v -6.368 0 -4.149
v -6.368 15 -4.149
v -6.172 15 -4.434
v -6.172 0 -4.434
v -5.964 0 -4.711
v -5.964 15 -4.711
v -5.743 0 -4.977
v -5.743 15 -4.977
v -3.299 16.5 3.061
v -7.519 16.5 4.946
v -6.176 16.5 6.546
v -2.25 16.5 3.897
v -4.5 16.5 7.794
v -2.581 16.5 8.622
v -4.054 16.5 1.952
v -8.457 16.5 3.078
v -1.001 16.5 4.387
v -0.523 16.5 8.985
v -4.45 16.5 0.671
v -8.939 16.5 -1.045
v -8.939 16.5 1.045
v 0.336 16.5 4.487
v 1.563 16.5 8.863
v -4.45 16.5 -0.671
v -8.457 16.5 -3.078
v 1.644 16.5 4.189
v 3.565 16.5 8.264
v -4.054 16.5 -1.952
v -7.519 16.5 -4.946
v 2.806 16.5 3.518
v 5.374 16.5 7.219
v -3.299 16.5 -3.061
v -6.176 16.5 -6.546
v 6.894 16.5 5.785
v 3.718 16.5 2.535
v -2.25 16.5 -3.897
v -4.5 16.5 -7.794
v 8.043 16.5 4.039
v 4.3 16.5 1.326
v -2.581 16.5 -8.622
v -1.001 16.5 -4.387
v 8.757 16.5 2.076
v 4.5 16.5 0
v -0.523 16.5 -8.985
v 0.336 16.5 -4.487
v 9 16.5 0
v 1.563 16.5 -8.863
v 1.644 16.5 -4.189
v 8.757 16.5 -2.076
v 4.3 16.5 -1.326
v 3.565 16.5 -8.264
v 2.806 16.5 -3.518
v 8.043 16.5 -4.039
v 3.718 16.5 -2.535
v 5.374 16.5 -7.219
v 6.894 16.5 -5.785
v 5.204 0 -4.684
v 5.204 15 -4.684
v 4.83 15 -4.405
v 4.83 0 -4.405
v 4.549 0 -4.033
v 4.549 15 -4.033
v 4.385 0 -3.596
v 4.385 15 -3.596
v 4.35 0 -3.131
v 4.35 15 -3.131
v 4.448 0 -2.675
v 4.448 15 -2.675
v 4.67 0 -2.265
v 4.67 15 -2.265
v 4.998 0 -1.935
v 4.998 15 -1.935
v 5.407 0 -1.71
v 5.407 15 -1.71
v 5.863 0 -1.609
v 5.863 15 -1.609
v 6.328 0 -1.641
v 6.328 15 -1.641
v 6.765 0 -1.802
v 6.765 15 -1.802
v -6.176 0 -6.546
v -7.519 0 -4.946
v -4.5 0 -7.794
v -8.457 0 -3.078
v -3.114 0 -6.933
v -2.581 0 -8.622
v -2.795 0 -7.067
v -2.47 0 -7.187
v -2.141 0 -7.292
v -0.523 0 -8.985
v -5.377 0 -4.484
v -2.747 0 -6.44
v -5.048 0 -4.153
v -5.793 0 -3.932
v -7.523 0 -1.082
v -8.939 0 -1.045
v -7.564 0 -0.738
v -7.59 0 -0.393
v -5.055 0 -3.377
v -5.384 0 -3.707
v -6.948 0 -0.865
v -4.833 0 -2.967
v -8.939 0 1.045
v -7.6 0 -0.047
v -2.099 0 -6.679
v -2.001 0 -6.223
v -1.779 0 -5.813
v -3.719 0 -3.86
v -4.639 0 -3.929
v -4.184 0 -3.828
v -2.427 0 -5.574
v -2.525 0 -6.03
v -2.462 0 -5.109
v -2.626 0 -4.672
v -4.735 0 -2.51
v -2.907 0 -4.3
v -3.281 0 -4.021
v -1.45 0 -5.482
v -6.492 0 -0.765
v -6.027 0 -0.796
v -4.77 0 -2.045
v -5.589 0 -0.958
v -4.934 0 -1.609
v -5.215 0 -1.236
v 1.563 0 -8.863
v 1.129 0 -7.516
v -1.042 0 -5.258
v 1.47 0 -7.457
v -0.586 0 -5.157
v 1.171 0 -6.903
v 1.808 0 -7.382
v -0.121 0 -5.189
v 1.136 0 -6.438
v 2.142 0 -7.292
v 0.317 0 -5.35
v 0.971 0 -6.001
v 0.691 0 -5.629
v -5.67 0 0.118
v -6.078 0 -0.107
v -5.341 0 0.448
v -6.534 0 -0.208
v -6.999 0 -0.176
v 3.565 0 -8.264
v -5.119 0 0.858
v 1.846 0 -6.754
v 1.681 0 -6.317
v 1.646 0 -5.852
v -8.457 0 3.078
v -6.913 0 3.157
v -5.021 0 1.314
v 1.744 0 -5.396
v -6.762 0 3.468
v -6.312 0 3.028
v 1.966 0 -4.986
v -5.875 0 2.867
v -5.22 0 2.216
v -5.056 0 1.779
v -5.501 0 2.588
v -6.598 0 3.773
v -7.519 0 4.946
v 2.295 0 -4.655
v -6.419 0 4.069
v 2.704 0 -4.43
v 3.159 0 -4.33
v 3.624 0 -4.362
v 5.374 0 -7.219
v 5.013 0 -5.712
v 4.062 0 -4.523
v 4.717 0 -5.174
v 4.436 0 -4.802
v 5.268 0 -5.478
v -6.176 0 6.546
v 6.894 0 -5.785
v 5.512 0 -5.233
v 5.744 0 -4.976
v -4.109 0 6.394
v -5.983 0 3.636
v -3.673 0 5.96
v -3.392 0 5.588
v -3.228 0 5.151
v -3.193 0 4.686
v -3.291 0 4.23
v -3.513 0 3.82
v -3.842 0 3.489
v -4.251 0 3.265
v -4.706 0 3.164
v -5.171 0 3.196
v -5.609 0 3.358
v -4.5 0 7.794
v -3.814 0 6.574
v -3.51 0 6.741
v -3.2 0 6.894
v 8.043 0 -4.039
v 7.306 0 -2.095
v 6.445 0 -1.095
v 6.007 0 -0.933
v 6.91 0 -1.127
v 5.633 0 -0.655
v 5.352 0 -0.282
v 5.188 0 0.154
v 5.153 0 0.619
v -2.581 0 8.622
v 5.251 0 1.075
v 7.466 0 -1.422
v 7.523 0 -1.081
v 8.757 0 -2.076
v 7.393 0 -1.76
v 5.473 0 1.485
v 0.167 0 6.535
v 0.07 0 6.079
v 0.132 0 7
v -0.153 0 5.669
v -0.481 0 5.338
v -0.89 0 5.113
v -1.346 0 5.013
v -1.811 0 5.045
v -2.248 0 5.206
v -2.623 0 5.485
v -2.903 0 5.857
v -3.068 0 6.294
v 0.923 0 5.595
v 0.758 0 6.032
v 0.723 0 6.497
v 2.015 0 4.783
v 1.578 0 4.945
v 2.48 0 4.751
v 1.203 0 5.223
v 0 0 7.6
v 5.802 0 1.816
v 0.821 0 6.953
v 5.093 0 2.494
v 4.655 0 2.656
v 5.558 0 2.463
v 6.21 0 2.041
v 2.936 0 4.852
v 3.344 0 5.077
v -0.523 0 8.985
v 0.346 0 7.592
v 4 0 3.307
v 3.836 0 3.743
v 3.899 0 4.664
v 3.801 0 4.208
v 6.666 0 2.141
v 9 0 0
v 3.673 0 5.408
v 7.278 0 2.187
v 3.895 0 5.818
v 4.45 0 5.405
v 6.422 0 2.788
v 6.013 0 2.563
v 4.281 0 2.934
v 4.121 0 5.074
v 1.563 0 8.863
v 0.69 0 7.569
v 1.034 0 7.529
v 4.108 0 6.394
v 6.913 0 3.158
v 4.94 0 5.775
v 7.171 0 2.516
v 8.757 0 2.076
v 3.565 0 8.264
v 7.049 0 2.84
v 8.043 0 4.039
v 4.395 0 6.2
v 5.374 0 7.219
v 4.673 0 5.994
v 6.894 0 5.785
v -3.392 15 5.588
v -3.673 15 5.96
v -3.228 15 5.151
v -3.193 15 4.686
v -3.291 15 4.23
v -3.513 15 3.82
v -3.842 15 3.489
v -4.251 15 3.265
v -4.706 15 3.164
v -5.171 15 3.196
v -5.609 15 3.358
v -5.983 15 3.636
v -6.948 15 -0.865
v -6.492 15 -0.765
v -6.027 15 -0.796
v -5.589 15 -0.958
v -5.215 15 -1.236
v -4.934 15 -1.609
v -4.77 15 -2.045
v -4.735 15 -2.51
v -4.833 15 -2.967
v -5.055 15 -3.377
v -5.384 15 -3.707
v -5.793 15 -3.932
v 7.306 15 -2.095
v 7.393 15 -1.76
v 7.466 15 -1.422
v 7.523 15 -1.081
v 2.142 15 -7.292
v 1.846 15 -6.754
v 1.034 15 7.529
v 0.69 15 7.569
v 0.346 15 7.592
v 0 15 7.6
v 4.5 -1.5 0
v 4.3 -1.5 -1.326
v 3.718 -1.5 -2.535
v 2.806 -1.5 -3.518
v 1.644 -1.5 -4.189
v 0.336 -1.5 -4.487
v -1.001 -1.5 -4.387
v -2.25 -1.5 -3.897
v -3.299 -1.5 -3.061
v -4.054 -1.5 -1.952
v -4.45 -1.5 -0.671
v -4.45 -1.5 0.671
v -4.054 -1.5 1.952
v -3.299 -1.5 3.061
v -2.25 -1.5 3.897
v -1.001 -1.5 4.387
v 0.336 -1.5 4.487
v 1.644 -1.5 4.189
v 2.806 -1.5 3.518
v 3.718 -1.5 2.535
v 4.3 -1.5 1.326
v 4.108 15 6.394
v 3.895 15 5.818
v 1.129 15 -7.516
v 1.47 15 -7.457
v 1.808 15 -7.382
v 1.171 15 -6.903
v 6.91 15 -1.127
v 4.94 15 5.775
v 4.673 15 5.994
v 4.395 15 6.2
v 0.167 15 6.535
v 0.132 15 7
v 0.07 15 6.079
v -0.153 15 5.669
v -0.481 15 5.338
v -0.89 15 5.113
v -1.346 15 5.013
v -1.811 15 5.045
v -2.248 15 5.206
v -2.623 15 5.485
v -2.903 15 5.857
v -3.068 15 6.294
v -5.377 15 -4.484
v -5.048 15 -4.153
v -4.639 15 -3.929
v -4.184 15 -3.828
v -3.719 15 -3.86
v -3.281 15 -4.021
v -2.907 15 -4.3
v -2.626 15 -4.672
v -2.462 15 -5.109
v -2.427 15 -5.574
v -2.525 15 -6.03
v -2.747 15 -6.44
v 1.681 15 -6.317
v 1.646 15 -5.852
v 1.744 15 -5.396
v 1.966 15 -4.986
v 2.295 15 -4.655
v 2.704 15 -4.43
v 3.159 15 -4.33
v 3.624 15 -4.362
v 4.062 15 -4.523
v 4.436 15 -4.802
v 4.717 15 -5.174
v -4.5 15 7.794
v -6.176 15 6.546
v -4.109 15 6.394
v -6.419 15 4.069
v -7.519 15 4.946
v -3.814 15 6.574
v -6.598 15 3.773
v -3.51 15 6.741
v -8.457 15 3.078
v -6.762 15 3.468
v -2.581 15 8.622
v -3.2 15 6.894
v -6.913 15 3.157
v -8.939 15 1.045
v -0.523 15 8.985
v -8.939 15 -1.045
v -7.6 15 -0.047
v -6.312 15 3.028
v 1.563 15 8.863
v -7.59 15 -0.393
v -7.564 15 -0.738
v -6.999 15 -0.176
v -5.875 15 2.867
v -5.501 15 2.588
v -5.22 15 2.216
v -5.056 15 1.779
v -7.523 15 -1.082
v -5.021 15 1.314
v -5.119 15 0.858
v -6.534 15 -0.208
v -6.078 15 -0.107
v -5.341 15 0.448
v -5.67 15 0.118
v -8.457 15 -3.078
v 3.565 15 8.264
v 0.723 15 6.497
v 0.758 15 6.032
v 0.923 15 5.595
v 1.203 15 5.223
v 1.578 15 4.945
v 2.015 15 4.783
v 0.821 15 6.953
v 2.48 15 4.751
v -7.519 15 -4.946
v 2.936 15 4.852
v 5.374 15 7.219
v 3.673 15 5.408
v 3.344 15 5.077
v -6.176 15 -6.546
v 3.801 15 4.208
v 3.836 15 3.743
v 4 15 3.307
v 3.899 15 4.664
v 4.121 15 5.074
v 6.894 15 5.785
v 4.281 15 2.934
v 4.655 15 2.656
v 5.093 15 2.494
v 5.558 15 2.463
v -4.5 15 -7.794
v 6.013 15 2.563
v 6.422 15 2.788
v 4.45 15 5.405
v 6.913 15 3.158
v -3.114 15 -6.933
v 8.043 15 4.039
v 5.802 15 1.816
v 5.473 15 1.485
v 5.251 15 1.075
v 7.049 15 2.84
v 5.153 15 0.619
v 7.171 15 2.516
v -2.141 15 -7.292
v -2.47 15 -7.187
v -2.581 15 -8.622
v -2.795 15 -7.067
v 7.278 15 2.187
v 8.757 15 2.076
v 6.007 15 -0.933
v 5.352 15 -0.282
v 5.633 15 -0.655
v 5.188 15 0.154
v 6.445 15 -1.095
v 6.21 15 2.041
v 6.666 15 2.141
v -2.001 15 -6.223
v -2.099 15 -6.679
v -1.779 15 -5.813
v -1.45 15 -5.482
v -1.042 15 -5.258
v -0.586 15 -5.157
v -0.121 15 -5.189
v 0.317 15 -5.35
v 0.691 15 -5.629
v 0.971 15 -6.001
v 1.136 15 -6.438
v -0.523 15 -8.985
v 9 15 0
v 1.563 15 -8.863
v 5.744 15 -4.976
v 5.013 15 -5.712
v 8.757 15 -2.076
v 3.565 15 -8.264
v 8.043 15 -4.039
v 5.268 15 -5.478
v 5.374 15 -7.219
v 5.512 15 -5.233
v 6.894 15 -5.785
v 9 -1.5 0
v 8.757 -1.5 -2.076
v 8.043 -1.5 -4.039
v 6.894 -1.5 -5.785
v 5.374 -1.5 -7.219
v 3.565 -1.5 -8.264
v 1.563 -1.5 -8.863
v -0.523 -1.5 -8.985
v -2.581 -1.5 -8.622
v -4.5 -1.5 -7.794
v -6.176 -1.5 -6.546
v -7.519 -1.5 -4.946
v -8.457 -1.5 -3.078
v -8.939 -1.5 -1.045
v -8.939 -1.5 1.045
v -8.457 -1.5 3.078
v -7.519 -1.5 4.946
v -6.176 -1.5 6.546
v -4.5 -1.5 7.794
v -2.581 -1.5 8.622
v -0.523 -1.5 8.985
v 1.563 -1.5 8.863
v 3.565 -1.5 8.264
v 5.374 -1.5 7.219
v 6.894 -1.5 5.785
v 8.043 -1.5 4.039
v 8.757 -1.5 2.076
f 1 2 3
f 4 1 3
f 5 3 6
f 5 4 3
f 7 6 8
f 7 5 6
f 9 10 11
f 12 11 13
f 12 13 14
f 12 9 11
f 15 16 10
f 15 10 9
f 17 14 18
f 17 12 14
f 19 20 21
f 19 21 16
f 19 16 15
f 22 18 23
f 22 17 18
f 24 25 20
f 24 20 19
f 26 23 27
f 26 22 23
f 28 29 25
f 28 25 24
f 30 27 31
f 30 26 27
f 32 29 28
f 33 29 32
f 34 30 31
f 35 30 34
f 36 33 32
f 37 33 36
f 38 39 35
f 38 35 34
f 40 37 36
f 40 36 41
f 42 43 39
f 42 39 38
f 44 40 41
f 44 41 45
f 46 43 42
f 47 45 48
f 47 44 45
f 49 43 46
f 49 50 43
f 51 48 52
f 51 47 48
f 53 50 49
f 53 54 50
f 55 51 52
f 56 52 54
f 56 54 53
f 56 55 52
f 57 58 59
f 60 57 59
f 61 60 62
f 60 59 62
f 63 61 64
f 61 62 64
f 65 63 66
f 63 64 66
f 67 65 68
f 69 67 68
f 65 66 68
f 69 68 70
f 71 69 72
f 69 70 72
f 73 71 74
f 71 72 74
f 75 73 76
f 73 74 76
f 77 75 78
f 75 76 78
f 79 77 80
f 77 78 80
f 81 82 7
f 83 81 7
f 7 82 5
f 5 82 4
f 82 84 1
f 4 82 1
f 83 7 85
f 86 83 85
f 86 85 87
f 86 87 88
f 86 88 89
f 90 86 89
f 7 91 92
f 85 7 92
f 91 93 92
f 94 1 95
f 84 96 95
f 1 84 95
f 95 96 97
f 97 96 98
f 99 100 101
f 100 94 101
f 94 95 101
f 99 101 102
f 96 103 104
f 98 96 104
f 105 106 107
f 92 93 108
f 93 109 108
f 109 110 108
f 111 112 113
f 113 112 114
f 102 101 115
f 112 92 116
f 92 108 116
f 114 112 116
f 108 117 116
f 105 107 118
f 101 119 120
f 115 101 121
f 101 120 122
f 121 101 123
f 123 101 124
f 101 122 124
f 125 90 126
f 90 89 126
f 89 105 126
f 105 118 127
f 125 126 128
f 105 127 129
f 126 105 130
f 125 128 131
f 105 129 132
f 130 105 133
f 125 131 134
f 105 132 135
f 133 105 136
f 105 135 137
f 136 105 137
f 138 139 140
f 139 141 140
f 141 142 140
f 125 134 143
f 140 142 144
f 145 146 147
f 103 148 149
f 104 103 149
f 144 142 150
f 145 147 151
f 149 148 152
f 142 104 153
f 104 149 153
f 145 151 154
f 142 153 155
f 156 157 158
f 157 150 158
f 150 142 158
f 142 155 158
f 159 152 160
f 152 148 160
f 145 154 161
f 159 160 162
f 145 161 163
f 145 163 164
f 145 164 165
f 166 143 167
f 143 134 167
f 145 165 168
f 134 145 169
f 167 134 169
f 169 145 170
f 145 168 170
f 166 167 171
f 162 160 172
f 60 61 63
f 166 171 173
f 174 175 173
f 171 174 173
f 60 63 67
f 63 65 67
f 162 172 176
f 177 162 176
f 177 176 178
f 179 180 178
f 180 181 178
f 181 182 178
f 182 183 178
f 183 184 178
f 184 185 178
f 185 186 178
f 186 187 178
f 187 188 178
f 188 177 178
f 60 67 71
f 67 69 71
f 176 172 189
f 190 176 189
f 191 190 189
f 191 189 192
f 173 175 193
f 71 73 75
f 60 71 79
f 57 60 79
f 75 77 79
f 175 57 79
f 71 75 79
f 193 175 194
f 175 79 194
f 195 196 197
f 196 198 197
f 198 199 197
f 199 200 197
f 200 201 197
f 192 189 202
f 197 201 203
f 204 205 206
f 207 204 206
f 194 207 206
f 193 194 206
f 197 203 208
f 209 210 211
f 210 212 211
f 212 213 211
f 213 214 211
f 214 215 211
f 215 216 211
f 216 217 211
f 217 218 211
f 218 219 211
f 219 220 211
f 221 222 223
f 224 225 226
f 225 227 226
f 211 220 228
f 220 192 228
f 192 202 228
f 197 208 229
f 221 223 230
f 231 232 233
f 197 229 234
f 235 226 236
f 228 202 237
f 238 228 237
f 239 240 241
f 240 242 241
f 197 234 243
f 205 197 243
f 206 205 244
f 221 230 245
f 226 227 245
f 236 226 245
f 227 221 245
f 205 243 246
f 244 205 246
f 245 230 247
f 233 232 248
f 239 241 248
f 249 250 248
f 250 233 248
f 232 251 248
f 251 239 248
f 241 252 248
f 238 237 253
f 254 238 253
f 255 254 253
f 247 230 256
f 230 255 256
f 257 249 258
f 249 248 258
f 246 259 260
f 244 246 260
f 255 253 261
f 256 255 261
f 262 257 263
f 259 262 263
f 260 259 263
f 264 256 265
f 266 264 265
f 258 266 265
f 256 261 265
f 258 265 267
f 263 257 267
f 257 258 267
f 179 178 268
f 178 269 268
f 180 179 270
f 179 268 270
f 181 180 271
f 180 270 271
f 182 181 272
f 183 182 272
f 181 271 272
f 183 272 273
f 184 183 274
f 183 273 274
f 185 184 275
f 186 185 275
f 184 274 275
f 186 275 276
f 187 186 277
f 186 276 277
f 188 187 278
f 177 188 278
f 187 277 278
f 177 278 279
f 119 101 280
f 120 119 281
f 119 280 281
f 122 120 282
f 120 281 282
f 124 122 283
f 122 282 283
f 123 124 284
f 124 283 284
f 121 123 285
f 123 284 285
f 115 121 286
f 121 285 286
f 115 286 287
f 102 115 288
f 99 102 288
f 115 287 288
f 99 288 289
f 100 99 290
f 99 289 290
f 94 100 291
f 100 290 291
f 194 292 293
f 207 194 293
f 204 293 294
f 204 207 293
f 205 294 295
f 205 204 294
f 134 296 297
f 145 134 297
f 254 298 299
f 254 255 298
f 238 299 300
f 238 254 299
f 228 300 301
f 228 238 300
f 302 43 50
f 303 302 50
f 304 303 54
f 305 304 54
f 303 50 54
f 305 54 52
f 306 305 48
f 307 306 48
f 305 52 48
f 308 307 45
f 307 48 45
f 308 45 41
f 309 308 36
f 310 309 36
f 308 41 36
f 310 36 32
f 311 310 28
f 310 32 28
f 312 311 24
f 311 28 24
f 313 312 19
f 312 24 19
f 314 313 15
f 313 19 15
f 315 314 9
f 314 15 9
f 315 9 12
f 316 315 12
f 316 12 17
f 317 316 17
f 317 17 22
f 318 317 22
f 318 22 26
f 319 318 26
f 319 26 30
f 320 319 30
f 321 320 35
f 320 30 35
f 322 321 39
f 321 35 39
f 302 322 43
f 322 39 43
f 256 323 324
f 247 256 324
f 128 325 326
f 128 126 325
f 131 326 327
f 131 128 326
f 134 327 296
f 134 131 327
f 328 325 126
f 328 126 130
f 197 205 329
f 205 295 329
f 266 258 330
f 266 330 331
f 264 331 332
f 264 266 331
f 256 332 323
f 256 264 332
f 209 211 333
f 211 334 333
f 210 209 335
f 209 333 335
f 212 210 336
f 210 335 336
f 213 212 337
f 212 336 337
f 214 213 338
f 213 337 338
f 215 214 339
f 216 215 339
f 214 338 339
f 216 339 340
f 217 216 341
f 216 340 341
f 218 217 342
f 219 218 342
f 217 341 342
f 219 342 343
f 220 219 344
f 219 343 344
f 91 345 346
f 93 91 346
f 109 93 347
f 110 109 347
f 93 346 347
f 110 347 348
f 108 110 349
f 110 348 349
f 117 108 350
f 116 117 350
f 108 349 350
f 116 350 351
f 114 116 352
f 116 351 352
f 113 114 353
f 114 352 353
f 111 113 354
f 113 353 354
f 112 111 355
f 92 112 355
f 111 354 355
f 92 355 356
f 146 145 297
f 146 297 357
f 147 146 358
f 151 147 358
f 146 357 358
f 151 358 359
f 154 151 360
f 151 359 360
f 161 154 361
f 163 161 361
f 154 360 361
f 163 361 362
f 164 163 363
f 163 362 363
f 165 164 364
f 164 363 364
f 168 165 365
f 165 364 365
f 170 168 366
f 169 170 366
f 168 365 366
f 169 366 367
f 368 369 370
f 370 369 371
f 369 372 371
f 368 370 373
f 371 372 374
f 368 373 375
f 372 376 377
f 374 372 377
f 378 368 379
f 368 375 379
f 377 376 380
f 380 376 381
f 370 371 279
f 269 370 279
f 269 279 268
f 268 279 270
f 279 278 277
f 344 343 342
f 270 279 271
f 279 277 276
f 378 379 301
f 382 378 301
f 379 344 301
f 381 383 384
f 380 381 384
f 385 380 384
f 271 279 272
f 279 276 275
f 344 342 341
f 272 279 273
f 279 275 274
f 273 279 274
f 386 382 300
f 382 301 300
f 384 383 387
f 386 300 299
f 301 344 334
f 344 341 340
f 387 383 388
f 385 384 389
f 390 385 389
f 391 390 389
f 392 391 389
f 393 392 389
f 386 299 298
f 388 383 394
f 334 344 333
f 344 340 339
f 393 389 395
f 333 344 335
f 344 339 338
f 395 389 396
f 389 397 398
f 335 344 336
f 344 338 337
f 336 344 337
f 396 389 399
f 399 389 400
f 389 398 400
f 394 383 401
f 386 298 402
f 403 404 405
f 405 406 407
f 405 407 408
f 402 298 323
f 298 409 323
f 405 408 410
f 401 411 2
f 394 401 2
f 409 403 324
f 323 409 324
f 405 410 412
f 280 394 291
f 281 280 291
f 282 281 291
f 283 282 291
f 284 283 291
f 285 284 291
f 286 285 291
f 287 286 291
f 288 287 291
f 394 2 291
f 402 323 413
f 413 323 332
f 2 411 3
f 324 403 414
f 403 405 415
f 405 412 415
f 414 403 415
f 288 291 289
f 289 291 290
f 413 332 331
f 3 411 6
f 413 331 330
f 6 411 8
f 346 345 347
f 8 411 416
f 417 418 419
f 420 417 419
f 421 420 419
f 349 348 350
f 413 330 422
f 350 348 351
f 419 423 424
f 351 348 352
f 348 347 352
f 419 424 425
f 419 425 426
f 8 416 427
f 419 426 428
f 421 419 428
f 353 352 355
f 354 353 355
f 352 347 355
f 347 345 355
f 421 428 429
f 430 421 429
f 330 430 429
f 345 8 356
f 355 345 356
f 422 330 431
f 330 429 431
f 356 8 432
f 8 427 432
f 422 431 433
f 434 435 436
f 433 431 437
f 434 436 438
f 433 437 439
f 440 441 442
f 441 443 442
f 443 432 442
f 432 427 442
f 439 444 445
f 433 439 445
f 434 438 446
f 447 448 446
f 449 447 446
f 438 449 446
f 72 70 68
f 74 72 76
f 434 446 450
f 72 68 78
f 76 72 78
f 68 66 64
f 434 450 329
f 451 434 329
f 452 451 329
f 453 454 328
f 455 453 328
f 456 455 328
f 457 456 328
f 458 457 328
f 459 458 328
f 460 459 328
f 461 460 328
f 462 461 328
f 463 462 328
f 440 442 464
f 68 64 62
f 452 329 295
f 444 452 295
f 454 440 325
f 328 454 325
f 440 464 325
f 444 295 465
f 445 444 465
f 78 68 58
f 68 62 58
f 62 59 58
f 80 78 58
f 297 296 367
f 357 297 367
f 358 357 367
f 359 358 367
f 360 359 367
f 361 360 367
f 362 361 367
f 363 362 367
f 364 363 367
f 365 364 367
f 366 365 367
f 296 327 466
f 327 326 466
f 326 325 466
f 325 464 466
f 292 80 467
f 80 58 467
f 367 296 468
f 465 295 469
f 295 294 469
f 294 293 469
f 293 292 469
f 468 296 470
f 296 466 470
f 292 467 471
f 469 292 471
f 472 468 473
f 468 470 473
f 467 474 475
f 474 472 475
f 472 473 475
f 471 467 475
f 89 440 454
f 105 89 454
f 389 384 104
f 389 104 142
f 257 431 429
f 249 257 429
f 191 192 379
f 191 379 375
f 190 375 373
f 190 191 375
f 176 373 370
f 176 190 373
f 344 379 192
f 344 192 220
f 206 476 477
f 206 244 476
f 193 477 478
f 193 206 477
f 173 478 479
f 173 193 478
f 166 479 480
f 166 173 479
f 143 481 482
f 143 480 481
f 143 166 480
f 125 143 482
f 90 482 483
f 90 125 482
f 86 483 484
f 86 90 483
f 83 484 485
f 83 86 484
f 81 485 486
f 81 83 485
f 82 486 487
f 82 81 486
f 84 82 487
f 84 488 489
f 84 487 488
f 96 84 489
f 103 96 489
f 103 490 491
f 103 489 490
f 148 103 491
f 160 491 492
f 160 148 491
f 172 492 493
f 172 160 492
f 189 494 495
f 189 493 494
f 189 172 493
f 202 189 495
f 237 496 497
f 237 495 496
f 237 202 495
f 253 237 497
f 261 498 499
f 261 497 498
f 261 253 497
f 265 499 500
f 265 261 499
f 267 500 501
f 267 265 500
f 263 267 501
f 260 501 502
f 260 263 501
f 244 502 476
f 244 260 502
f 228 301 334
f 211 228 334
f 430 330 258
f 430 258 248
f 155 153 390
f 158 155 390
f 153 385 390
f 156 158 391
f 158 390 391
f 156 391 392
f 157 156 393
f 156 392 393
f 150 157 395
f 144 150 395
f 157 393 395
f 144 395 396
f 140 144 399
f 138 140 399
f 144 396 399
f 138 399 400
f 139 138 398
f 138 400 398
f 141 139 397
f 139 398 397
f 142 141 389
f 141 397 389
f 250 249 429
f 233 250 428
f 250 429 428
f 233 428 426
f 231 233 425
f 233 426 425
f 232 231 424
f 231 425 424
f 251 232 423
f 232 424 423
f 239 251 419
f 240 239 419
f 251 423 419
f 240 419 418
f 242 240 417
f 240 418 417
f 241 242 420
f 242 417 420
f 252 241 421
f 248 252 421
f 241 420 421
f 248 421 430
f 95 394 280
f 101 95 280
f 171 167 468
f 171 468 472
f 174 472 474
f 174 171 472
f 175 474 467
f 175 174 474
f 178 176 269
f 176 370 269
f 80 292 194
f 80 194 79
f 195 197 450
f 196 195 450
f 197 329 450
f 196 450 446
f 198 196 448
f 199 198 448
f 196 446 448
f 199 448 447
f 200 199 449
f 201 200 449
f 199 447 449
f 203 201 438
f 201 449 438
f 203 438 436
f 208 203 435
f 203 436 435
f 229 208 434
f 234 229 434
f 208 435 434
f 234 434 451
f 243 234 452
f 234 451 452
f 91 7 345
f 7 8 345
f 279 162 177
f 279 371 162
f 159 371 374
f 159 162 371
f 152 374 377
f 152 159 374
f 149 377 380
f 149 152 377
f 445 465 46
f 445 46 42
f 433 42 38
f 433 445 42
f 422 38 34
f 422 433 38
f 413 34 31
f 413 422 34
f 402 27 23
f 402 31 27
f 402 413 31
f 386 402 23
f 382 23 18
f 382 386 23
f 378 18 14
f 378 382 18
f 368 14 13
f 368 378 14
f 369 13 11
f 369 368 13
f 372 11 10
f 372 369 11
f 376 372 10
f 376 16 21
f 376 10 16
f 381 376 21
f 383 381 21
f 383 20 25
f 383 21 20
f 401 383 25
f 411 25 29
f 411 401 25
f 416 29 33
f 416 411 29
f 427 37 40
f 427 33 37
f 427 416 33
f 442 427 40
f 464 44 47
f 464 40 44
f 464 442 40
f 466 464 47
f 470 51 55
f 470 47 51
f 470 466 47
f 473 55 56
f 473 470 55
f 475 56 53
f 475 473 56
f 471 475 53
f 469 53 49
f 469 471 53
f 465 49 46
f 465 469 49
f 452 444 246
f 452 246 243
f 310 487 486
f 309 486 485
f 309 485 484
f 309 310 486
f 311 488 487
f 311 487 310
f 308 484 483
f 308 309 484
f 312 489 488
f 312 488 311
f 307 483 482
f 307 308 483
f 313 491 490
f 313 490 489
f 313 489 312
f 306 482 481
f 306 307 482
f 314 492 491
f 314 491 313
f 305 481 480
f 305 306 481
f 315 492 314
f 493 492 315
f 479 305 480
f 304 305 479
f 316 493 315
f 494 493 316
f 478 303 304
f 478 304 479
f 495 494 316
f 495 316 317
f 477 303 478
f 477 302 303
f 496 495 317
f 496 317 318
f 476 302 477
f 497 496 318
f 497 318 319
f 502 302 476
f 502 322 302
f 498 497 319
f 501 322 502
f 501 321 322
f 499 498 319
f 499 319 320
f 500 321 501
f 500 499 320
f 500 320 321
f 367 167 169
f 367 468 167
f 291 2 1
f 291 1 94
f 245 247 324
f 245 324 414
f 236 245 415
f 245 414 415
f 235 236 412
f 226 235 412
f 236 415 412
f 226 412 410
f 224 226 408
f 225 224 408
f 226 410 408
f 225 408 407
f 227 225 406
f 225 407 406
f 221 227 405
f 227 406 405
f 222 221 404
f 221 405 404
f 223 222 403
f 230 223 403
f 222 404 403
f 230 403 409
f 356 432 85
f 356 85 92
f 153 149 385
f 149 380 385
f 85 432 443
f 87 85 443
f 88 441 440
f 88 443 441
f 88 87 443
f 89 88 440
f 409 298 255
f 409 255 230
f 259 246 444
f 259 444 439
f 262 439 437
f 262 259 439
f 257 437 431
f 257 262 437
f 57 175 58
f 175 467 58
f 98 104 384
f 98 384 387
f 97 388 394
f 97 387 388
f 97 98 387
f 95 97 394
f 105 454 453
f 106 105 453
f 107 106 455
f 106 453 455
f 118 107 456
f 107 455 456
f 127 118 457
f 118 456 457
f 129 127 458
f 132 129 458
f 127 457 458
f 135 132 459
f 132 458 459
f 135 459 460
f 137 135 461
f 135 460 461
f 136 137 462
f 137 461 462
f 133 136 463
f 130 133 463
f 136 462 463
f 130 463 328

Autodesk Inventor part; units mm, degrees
ref_plane "YZ Plane" through (0, 0, 0) normal (1, 0, 0) x (0, 1, 0)
ref_plane "XZ Plane" through (0, 0, 0) normal (0, 1, 0) x (-1, 0, 0)
ref_plane "XY Plane" through (0, 0, 0) normal (0, 0, 1) x (1, 0, 0)
sketch "Esquisse2" plane through (0, 0, 0) normal (0, 1, 0) x (-1, 0, 0)
  circle A0 centre (0, 0) radius 7.6
  dimension "d0" = 15.2
extrude "Extrusion1" add sketch "Esquisse2" along normal blind 15
sketch "Esquisse4" plane through (0, 15, 0) normal (0, 1, 0) x (1, 0, 0)
  circle A0 centre (0, 0) radius 7.6 projected
  circle A1 centre (0, 0) radius 7.6 projected
  arc A2 (-3.2, -6.8935) -> (0, -7.6) centre (0, 0) ccw
  line L0 (-0.0062, -0.0113) -> (-4.6214, -8.4012)
  line L1 (0, -6.3735) -> (0, 5.2233) construction
  line L2 (-3.2, -6.8935) -> (0, -7.6) construction
  line L3 (-3.2, -6.8935) -> (-3.0675, -6.2935)
  line L4 (0, -7.6) -> (0.1325, -7)
  arc A3 (0.1325, -7) -> (-3.0675, -6.2935) centre (-1.4675, -6.6467) ccw
  line L5 (-3.0675, -6.2935) -> (0.1325, -7) construction
  arc A4 (-6.419, -4.069) -> (-4.109, -6.3935) centre (0, 0) ccw
  line L6 (-4.109, -6.3935) -> (-6.419, -4.069) construction
  line L7 (-4.109, -6.3935) -> (-3.6731, -5.9603)
  line L8 (-6.419, -4.069) -> (-5.9831, -3.6359)
  arc A5 (-3.6731, -5.9603) -> (-5.9831, -3.6359) centre (-4.8281, -4.7981) ccw
  line L9 (-3.6731, -5.9603) -> (-5.9831, -3.6359) construction
  line L10 (-4.109, -6.3935) -> (-3.2, -6.8935) construction
  line L11 (0, 0) -> (-8.9658, -4.8594)
  arc A6 (-6.3677, 4.1487) -> (-7.5226, 1.0819) centre (0, 0) ccw
  line L12 (-7.5226, 1.0819) -> (-6.3677, 4.1487) construction
  line L13 (-7.5226, 1.0819) -> (-6.9476, 0.8653)
  line L14 (-6.3677, 4.1487) -> (-5.7927, 3.9322)
  arc A7 (-6.9476, 0.8653) -> (-5.7927, 3.9322) centre (-6.3701, 2.3988) ccw
  line L15 (-6.9476, 0.8653) -> (-5.7927, 3.9322) construction
  arc A8 (-7.5999, 0.0474) -> (-6.9133, -3.157) centre (0, 0) ccw
  line L16 (-7.5999, 0.0474) -> (-6.9133, -3.157) construction
  line L17 (-7.5999, 0.0474) -> (-6.999, 0.1761)
  line L18 (-6.9133, -3.157) -> (-6.3125, -3.0282)
  arc A9 (-6.3125, -3.0282) -> (-6.999, 0.1761) centre (-6.6558, -1.4261) ccw
  line L19 (-6.999, 0.1761) -> (-6.3125, -3.0282) construction
  line L20 (-7.5999, 0.0474) -> (-7.5226, 1.0819) construction
  line L21 (-6.9133, -3.157) -> (-6.419, -4.069) construction
  line L22 (0, 0) -> (-6.7758, 5.1057)
  arc A10 (7.3055, 2.0952) -> (5.7441, 4.9764) centre (0, 0) ccw
  line L23 (5.7441, 4.9764) -> (7.3055, 2.0952) construction
  line L24 (5.7441, 4.9764) -> (5.2039, 4.6837)
  line L25 (7.3055, 2.0952) -> (6.7653, 1.8025)
  arc A11 (5.2039, 4.6837) -> (6.7653, 1.8025) centre (5.9846, 3.2431) ccw
  line L26 (5.2039, 4.6837) -> (6.7653, 1.8025) construction
  arc A12 (5.0129, 5.7123) -> (2.1417, 7.292) centre (0, 0) ccw
  line L27 (5.0129, 5.7123) -> (2.1417, 7.292) construction
  line L28 (5.0129, 5.7123) -> (4.7167, 5.174)
  line L29 (2.1417, 7.292) -> (1.8455, 6.7536)
  arc A13 (1.8455, 6.7536) -> (4.7167, 5.174) centre (3.2811, 5.9638) ccw
  line L30 (4.7167, 5.174) -> (1.8455, 6.7536) construction
  line L31 (5.0129, 5.7123) -> (5.7441, 4.9764) construction
  line L32 (-3.1138, 6.9328) -> (-2.7472, 6.4398)
  arc A14 (-5.3768, 4.4842) -> (-2.7472, 6.4398) centre (-4.062, 5.462) ccw
  line L33 (-2.7472, 6.4398) -> (-5.3768, 4.4842) construction
  line L34 (-3.1138, 6.9328) -> (-5.7434, 4.9772) construction
  arc A15 (-3.1138, 6.9328) -> (-5.7434, 4.9772) centre (0, 0) ccw
  line L35 (-5.7434, 4.9772) -> (-5.3768, 4.4842)
  line L36 (-2.1407, 7.2923) -> (-3.1138, 6.9328) construction
  line L37 (-2.1407, 7.2923) -> (-2.0988, 6.6793)
  line L38 (-2.0988, 6.6793) -> (1.1706, 6.9027) construction
  line L39 (-2.1407, 7.2923) -> (1.1287, 7.5157) construction
  arc A16 (1.1287, 7.5157) -> (-2.1407, 7.2923) centre (0, 0) ccw
  arc A17 (-2.0988, 6.6793) -> (1.1706, 6.9027) centre (-0.4641, 6.791) ccw
  line L40 (1.1287, 7.5157) -> (1.1706, 6.9027)
  line L41 (1.1287, 7.5157) -> (2.1417, 7.292) construction
  line L42 (-6.3677, 4.1487) -> (-5.7434, 4.9772) construction
  line L43 (0, 0) -> (10.678, -14.3583) construction
  arc A18 (7.2785, -2.1871) -> (7.5228, 1.0808) centre (0, 0) ccw
  line L44 (7.5228, 1.0808) -> (7.2785, -2.1871) construction
  line L45 (7.5228, 1.0808) -> (6.91, 1.1266)
  line L46 (7.2785, -2.1871) -> (6.6658, -2.1413)
  arc A19 (6.91, 1.1266) -> (6.6658, -2.1413) centre (6.7879, -0.5073) ccw
  line L47 (6.91, 1.1266) -> (6.6658, -2.1413) construction
  line L48 (7.3055, 2.0952) -> (7.5228, 1.0808) construction
  line L49 (7.2785, -2.1871) -> (0, -7.6) construction
  line L50 (0, 0) -> (10.2791, -3.8716)
  line L51 (1.0339, -7.5293) -> (0.8211, -6.9529)
  arc A20 (3.8952, -5.8176) -> (0.8211, -6.9529) centre (2.3581, -6.3853) ccw
  arc A21 (1.0339, -7.5293) -> (4.1081, -6.394) centre (0, 0) ccw
  line L52 (4.1081, -6.394) -> (3.8952, -5.8176)
  line L53 (0.8211, -6.9529) -> (3.8952, -5.8176) construction
  line L54 (4.9405, -5.775) -> (4.4498, -5.4052)
  arc A22 (6.4221, -2.7881) -> (4.4498, -5.4052) centre (5.436, -4.0967) ccw
  line L55 (4.4498, -5.4052) -> (6.4221, -2.7881) construction
  line L56 (4.9405, -5.775) -> (6.9128, -3.1579) construction
  arc A23 (4.9405, -5.775) -> (6.9128, -3.1579) centre (0, 0) ccw
  line L57 (6.9128, -3.1579) -> (6.4221, -2.7881)
  line L58 (7.2785, -2.1871) -> (6.9128, -3.1579) construction
  point P0 (-7.5999, 0.0474)
  point P1 (-6.9133, -3.157)
  point P2 (-6.3677, 4.1487)
  point P3 (-7.5226, 1.0819)
  point P4 (-3.1138, 6.9328)
  point P5 (-5.7434, 4.9772)
  point P6 (1.1287, 7.5157)
  point P7 (-2.1407, 7.2923)
  point P8 (5.0129, 5.7123)
  point P9 (2.1417, 7.292)
  point P10 (7.3055, 2.0952)
  point P11 (5.7441, 4.9764)
  point P12 (-3.2, -6.8935)
  point P13 (0, -7.6)
  point P14 (-6.419, -4.069)
  point P15 (-4.109, -6.3935)
  point P16 (7.2785, -2.1871)
  point P17 (7.5228, 1.0808)
  point P18 (4.9405, -5.775)
  point P19 (4.9405, -5.775)
  point P20 (6.9128, -3.1579)
  point P21 (1.0339, -7.5293)
  point P22 (4.1081, -6.394)
  dimension "d14" = 3.2
  dimension "d28" = 0.6
  dimension "d30" = 0.5
extrude "Extrusion6" cut sketch "Esquisse4" against normal blind 15 contours A0 L46 A19 L45 | L25 A11 L24 A0 | A0 L54 A22 L57 | L28 A13 L29 A0 | A0 L51 A20 L52 | A0 L17 A9 L18 | L8 A5 L7 A0 | A0 L32 A14 L35 | L14 A7 L13 A0 | L40 A17 L37 A0 | A0 L3 A3 L4
sketch "Esquisse6" plane through (0, 15, 0) normal (0, 1, 0) x (1, 0, 0)
  circle A0 centre (0, 0) radius 9
  dimension "d19" = 18
extrude "Extrusion3" add sketch "Esquisse6" along normal blind 1.5
sketch "Esquisse7" plane through (0, 0, 0) normal (0, -1, 0) x (1, 0, 0)
  circle A0 centre (0, 0) radius 9
  dimension "d34" = 18
extrude "Extrusion4" add sketch "Esquisse7" along normal blind 1.5
sketch "Esquisse8" plane through (0, 16.5, 0) normal (0, 1, 0) x (1, 0, 0)
  circle A0 centre (0, 0) radius 4.5
  dimension "d24" = 9
extrude "Extrusion5" cut sketch "Esquisse8" against normal through all
properties part number "Pièce_moteur_courroie_test_4"
